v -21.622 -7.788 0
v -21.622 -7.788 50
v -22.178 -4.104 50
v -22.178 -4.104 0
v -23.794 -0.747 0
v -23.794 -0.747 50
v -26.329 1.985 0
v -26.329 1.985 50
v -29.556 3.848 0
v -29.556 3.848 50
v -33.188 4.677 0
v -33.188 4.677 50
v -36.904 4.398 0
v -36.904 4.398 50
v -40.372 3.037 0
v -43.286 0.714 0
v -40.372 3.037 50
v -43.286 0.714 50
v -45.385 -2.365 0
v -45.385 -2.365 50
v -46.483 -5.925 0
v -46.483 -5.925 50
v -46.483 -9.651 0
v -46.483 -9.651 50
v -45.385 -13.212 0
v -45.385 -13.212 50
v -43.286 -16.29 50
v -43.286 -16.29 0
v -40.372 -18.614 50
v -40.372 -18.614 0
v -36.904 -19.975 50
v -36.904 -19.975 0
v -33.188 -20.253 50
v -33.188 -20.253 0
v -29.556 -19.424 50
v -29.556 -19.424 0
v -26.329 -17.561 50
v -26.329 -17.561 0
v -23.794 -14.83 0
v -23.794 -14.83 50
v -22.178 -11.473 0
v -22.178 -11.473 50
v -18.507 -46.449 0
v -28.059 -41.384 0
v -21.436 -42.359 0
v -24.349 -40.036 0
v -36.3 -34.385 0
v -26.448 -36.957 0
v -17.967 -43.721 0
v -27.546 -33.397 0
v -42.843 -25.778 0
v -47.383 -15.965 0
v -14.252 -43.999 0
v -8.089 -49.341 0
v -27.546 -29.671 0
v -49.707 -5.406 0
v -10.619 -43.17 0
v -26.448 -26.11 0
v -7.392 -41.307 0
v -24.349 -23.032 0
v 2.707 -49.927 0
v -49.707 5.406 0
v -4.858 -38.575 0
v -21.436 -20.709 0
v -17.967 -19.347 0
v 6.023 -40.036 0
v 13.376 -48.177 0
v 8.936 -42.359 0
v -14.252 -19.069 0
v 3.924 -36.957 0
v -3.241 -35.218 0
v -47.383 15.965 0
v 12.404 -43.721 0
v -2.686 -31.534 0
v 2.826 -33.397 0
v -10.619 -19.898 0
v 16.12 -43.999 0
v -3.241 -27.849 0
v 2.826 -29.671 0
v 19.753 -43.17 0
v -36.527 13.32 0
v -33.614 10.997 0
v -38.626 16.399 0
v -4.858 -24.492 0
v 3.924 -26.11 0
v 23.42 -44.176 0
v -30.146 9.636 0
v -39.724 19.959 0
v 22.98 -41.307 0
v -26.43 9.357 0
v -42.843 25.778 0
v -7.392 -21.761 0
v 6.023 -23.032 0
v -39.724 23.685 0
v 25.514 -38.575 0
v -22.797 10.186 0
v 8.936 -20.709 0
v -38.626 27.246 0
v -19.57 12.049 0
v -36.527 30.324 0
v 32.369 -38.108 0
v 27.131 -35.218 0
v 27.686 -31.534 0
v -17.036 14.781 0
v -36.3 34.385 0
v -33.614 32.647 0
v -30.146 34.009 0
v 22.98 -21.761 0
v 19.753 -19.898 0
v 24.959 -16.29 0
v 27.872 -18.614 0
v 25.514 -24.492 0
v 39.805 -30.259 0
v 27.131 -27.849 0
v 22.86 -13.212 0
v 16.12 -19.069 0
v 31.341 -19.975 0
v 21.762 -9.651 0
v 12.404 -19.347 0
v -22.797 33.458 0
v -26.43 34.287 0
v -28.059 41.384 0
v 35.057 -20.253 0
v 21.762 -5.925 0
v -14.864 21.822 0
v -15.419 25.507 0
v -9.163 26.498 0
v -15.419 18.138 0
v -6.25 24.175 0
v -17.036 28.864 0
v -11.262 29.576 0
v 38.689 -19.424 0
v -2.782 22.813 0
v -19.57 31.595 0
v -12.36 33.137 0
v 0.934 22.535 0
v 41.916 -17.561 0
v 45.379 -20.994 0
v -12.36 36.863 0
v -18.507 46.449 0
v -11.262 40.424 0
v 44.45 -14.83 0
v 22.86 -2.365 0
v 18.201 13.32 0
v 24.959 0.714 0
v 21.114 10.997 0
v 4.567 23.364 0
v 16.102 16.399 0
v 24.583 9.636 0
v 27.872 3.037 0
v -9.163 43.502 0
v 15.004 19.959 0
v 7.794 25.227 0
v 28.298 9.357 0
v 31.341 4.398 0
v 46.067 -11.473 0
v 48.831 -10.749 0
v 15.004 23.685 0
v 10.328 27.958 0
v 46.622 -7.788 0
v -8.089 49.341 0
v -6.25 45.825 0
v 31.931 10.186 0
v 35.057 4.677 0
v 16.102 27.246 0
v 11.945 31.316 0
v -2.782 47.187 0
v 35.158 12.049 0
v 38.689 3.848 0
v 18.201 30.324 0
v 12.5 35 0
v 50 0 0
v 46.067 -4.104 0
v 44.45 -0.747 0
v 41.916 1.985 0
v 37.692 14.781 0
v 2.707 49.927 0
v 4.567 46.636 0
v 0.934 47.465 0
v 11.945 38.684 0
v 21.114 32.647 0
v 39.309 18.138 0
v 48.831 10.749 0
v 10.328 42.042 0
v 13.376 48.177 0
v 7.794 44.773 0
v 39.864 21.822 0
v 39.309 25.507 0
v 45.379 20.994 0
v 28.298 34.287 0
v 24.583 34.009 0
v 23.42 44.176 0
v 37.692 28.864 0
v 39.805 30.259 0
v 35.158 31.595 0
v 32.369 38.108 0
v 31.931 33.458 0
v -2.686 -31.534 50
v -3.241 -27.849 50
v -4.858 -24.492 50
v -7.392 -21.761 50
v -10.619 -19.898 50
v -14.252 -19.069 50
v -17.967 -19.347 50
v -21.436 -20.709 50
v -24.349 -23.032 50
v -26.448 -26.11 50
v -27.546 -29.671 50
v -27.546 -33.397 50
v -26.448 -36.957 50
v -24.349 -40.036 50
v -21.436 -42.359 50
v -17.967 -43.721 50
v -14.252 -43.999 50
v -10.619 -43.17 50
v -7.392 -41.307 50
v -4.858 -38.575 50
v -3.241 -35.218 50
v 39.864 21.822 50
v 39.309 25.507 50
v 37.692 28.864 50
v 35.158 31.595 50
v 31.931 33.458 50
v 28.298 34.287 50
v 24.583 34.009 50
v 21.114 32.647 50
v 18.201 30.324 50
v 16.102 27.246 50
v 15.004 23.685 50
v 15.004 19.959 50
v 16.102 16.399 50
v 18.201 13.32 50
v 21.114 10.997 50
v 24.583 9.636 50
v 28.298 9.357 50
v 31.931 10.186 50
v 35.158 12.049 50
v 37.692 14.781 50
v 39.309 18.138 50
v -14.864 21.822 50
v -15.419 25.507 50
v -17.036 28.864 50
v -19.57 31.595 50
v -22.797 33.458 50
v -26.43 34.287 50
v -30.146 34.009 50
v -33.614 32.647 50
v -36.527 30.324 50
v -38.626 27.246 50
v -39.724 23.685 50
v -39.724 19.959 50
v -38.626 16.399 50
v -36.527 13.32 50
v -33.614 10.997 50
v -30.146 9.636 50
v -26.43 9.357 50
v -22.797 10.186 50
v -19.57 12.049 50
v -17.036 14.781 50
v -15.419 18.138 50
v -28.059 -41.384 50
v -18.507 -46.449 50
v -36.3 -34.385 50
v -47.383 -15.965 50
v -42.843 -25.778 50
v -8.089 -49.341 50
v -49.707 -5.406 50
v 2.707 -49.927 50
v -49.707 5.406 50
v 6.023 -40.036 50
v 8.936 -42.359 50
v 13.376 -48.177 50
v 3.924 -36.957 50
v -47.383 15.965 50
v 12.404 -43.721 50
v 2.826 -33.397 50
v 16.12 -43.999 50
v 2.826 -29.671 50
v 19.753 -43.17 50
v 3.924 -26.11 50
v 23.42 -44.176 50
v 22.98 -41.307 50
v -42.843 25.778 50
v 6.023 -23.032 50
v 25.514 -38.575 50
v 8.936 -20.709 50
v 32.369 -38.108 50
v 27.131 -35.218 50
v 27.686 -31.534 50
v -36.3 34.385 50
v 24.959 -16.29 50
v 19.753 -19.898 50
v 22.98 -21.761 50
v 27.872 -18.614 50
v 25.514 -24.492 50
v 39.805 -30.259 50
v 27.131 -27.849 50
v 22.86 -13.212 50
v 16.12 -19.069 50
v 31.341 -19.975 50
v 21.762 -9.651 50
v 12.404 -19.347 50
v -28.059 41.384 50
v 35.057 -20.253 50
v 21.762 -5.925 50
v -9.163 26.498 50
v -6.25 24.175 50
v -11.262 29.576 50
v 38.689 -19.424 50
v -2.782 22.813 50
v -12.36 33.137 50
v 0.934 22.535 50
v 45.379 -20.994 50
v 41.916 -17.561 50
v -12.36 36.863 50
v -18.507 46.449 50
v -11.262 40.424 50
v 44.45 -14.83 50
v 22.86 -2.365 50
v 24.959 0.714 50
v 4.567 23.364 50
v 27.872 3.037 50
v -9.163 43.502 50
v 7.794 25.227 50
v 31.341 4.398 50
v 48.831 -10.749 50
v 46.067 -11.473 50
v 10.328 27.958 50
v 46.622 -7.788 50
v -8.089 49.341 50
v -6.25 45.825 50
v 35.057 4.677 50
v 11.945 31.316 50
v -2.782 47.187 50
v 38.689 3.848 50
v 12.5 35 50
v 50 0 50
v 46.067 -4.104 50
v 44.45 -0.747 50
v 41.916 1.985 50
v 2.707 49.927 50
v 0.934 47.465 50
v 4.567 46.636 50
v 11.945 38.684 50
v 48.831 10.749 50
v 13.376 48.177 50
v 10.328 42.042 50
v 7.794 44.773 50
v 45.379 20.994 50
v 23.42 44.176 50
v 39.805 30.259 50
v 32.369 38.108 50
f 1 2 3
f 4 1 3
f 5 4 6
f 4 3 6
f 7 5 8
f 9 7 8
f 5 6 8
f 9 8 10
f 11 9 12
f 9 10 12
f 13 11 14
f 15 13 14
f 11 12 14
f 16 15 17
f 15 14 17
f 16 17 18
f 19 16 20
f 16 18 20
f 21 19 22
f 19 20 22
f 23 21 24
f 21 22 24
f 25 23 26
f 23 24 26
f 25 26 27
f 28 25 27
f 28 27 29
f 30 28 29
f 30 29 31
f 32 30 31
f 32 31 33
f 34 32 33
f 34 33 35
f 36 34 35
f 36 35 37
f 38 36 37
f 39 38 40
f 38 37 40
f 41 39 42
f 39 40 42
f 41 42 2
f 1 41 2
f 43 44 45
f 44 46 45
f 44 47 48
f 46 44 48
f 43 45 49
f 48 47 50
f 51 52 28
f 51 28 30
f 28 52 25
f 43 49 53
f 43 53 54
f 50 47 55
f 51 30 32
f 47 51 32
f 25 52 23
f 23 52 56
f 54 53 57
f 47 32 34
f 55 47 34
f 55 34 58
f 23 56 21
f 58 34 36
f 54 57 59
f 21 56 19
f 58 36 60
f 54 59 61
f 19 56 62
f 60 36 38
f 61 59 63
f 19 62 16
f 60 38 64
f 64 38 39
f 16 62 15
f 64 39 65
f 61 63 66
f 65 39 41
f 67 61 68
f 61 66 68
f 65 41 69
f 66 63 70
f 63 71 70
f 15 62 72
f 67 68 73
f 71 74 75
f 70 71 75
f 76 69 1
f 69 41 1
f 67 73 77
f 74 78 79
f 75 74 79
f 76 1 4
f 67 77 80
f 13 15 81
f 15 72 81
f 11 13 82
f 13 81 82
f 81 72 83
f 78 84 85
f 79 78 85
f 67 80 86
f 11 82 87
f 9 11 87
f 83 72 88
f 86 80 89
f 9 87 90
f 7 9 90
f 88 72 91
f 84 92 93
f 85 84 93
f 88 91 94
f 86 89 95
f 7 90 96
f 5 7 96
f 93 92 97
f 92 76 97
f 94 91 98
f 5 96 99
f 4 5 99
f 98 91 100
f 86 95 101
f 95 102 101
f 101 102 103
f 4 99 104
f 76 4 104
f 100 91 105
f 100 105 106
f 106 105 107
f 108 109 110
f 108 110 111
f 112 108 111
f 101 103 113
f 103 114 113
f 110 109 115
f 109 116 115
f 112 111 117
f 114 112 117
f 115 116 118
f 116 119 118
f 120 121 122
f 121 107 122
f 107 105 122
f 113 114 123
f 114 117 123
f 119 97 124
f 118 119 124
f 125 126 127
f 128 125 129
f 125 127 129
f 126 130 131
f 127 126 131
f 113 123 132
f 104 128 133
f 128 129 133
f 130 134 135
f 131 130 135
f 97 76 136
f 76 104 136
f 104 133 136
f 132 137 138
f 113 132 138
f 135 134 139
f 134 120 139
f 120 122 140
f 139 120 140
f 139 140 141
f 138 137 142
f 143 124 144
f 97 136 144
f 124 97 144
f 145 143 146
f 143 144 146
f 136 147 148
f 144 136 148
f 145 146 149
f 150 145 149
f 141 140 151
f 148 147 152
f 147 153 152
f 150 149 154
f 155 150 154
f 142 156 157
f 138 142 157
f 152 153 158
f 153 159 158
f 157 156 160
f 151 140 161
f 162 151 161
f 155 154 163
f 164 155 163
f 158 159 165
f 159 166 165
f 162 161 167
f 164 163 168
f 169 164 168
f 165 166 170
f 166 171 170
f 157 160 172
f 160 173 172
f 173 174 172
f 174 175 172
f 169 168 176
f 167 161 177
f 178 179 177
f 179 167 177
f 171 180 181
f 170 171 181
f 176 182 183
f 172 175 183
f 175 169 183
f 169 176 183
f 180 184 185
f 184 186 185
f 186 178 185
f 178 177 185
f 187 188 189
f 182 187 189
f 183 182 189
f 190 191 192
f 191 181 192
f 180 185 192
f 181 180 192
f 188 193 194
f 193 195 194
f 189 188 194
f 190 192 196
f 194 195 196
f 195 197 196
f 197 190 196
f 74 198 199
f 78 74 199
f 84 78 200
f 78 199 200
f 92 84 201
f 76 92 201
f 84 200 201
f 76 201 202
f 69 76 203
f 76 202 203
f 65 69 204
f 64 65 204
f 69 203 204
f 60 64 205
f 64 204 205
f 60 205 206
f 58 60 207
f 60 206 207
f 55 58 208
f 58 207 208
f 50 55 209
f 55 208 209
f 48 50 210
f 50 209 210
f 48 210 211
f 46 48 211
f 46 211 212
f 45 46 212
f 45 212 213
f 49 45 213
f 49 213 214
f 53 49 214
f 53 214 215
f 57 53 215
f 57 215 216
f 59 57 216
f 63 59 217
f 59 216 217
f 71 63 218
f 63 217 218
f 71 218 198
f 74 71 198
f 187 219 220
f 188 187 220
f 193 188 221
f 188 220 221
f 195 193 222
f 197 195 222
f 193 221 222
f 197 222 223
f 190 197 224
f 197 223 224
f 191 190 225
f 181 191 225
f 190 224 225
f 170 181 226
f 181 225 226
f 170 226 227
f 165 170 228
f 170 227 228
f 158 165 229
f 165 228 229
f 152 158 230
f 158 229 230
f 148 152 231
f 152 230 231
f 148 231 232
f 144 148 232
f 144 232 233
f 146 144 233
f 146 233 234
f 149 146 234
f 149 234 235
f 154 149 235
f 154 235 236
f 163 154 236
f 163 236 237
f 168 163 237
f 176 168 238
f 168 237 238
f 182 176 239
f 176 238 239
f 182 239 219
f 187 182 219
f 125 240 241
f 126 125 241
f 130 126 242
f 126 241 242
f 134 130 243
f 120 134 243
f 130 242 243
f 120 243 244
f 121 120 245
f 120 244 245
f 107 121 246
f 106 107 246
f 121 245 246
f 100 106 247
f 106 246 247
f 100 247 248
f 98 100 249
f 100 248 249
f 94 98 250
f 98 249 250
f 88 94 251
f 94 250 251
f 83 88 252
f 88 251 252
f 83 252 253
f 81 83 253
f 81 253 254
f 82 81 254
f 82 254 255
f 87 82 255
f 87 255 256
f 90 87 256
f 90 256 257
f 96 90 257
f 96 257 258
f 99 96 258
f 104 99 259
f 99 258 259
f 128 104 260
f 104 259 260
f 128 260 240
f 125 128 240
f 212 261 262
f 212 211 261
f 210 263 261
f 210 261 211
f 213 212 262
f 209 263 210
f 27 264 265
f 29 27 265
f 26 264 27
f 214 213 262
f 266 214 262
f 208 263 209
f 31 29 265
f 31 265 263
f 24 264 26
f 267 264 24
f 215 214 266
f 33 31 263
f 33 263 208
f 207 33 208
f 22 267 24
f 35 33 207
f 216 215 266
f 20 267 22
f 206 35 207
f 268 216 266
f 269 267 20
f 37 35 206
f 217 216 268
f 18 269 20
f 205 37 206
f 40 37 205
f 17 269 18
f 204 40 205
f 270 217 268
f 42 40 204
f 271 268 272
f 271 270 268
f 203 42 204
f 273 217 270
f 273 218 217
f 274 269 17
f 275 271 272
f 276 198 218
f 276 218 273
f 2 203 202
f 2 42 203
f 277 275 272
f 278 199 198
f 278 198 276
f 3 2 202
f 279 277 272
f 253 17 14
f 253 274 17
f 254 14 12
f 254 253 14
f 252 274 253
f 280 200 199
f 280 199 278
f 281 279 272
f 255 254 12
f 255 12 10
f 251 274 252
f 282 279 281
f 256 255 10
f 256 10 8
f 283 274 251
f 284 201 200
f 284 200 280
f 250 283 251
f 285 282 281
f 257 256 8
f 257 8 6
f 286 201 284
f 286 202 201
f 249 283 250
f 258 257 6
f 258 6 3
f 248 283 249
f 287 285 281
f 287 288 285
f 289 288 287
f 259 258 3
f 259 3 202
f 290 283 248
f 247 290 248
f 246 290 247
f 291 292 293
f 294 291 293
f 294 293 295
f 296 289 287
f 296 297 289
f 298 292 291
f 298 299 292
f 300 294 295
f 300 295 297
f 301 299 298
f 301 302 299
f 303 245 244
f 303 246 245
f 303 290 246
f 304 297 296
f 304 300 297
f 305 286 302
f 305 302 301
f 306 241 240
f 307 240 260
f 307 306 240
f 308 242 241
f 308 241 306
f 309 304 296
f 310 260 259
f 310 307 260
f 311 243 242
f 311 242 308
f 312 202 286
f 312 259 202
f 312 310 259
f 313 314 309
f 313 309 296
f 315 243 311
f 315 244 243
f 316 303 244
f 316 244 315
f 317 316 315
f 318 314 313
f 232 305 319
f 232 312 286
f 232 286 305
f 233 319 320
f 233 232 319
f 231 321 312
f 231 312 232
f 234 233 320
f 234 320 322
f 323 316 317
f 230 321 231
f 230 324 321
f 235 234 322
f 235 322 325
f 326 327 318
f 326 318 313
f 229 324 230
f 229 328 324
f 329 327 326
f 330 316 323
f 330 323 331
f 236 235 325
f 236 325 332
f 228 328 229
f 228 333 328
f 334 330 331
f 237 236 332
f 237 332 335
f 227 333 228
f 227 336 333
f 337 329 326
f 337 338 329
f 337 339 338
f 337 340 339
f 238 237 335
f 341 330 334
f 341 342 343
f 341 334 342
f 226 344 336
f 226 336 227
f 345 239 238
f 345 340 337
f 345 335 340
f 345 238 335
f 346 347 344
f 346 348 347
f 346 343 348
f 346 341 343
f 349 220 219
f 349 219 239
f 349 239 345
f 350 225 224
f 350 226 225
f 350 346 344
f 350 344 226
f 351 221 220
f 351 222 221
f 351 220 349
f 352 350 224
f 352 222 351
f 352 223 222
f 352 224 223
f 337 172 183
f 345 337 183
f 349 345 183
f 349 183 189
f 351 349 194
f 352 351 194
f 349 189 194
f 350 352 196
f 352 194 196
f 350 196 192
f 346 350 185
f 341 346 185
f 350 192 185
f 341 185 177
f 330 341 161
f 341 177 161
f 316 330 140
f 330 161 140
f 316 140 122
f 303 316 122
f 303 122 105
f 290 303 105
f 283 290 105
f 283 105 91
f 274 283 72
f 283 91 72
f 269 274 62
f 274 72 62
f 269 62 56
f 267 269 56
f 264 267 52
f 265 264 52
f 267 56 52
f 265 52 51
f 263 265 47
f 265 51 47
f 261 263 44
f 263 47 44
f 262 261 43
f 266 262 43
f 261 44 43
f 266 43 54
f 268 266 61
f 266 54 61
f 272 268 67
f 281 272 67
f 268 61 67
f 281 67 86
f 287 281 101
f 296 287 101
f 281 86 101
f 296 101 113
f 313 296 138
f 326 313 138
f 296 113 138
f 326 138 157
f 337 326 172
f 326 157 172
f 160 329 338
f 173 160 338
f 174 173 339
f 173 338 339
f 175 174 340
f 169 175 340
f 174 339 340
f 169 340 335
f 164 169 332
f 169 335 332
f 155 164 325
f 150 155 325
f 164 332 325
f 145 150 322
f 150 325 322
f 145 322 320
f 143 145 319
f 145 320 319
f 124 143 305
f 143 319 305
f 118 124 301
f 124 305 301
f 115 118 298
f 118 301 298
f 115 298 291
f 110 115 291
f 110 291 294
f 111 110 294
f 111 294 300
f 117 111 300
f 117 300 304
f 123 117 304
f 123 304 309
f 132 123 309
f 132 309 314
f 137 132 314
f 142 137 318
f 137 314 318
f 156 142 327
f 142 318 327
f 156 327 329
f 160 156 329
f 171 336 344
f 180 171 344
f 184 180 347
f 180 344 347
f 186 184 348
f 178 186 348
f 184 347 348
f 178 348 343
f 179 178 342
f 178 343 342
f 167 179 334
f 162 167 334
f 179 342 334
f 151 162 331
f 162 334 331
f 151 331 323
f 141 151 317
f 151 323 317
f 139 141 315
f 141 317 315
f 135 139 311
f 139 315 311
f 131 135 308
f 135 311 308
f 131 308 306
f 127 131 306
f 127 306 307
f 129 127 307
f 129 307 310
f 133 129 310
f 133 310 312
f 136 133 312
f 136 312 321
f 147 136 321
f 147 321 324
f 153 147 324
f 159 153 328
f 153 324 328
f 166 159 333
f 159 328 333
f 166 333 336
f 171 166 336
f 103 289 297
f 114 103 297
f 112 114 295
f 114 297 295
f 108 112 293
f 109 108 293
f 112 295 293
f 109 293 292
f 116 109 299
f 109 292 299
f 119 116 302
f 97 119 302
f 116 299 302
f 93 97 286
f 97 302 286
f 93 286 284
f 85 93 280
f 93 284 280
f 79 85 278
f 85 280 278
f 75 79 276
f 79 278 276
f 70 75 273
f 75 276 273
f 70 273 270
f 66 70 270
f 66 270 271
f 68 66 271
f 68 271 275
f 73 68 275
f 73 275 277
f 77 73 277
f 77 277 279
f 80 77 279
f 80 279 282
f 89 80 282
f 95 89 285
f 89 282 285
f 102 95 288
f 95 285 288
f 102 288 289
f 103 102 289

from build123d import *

# Parameters (mm, degrees)
F0_R     = 50
F1_DEPTH = 50
F2_R     = 12.5
F3_DEPTH = 50


with BuildPart() as f1:
    # F0 (on Top) → F1 (new body)
    with BuildSketch(Plane.XY):
        Circle(F0_R)
    extrude(amount=F1_DEPTH)

    # F2 (on face) → F3 (cut, through all)
    with BuildSketch(Plane.XY.offset(50)):
        with Locations((-15.185931, -31.53391)):
            Circle(F2_R)
        with Locations((15.185931, -31.53391)):
            Circle(F2_R)
        with Locations((34.122477, -7.788233)):
            Circle(F2_R)
        with Locations((27.364102, 21.822143)):
            Circle(F2_R)
        with Locations((0, 35)):
            Circle(F2_R)
        with Locations((-27.364102, 21.822143)):
            Circle(F2_R)
        with Locations((-34.122477, -7.788233)):
            Circle(F2_R)
    extrude(amount=-F3_DEPTH, mode=Mode.SUBTRACT)


solid = f1.part
